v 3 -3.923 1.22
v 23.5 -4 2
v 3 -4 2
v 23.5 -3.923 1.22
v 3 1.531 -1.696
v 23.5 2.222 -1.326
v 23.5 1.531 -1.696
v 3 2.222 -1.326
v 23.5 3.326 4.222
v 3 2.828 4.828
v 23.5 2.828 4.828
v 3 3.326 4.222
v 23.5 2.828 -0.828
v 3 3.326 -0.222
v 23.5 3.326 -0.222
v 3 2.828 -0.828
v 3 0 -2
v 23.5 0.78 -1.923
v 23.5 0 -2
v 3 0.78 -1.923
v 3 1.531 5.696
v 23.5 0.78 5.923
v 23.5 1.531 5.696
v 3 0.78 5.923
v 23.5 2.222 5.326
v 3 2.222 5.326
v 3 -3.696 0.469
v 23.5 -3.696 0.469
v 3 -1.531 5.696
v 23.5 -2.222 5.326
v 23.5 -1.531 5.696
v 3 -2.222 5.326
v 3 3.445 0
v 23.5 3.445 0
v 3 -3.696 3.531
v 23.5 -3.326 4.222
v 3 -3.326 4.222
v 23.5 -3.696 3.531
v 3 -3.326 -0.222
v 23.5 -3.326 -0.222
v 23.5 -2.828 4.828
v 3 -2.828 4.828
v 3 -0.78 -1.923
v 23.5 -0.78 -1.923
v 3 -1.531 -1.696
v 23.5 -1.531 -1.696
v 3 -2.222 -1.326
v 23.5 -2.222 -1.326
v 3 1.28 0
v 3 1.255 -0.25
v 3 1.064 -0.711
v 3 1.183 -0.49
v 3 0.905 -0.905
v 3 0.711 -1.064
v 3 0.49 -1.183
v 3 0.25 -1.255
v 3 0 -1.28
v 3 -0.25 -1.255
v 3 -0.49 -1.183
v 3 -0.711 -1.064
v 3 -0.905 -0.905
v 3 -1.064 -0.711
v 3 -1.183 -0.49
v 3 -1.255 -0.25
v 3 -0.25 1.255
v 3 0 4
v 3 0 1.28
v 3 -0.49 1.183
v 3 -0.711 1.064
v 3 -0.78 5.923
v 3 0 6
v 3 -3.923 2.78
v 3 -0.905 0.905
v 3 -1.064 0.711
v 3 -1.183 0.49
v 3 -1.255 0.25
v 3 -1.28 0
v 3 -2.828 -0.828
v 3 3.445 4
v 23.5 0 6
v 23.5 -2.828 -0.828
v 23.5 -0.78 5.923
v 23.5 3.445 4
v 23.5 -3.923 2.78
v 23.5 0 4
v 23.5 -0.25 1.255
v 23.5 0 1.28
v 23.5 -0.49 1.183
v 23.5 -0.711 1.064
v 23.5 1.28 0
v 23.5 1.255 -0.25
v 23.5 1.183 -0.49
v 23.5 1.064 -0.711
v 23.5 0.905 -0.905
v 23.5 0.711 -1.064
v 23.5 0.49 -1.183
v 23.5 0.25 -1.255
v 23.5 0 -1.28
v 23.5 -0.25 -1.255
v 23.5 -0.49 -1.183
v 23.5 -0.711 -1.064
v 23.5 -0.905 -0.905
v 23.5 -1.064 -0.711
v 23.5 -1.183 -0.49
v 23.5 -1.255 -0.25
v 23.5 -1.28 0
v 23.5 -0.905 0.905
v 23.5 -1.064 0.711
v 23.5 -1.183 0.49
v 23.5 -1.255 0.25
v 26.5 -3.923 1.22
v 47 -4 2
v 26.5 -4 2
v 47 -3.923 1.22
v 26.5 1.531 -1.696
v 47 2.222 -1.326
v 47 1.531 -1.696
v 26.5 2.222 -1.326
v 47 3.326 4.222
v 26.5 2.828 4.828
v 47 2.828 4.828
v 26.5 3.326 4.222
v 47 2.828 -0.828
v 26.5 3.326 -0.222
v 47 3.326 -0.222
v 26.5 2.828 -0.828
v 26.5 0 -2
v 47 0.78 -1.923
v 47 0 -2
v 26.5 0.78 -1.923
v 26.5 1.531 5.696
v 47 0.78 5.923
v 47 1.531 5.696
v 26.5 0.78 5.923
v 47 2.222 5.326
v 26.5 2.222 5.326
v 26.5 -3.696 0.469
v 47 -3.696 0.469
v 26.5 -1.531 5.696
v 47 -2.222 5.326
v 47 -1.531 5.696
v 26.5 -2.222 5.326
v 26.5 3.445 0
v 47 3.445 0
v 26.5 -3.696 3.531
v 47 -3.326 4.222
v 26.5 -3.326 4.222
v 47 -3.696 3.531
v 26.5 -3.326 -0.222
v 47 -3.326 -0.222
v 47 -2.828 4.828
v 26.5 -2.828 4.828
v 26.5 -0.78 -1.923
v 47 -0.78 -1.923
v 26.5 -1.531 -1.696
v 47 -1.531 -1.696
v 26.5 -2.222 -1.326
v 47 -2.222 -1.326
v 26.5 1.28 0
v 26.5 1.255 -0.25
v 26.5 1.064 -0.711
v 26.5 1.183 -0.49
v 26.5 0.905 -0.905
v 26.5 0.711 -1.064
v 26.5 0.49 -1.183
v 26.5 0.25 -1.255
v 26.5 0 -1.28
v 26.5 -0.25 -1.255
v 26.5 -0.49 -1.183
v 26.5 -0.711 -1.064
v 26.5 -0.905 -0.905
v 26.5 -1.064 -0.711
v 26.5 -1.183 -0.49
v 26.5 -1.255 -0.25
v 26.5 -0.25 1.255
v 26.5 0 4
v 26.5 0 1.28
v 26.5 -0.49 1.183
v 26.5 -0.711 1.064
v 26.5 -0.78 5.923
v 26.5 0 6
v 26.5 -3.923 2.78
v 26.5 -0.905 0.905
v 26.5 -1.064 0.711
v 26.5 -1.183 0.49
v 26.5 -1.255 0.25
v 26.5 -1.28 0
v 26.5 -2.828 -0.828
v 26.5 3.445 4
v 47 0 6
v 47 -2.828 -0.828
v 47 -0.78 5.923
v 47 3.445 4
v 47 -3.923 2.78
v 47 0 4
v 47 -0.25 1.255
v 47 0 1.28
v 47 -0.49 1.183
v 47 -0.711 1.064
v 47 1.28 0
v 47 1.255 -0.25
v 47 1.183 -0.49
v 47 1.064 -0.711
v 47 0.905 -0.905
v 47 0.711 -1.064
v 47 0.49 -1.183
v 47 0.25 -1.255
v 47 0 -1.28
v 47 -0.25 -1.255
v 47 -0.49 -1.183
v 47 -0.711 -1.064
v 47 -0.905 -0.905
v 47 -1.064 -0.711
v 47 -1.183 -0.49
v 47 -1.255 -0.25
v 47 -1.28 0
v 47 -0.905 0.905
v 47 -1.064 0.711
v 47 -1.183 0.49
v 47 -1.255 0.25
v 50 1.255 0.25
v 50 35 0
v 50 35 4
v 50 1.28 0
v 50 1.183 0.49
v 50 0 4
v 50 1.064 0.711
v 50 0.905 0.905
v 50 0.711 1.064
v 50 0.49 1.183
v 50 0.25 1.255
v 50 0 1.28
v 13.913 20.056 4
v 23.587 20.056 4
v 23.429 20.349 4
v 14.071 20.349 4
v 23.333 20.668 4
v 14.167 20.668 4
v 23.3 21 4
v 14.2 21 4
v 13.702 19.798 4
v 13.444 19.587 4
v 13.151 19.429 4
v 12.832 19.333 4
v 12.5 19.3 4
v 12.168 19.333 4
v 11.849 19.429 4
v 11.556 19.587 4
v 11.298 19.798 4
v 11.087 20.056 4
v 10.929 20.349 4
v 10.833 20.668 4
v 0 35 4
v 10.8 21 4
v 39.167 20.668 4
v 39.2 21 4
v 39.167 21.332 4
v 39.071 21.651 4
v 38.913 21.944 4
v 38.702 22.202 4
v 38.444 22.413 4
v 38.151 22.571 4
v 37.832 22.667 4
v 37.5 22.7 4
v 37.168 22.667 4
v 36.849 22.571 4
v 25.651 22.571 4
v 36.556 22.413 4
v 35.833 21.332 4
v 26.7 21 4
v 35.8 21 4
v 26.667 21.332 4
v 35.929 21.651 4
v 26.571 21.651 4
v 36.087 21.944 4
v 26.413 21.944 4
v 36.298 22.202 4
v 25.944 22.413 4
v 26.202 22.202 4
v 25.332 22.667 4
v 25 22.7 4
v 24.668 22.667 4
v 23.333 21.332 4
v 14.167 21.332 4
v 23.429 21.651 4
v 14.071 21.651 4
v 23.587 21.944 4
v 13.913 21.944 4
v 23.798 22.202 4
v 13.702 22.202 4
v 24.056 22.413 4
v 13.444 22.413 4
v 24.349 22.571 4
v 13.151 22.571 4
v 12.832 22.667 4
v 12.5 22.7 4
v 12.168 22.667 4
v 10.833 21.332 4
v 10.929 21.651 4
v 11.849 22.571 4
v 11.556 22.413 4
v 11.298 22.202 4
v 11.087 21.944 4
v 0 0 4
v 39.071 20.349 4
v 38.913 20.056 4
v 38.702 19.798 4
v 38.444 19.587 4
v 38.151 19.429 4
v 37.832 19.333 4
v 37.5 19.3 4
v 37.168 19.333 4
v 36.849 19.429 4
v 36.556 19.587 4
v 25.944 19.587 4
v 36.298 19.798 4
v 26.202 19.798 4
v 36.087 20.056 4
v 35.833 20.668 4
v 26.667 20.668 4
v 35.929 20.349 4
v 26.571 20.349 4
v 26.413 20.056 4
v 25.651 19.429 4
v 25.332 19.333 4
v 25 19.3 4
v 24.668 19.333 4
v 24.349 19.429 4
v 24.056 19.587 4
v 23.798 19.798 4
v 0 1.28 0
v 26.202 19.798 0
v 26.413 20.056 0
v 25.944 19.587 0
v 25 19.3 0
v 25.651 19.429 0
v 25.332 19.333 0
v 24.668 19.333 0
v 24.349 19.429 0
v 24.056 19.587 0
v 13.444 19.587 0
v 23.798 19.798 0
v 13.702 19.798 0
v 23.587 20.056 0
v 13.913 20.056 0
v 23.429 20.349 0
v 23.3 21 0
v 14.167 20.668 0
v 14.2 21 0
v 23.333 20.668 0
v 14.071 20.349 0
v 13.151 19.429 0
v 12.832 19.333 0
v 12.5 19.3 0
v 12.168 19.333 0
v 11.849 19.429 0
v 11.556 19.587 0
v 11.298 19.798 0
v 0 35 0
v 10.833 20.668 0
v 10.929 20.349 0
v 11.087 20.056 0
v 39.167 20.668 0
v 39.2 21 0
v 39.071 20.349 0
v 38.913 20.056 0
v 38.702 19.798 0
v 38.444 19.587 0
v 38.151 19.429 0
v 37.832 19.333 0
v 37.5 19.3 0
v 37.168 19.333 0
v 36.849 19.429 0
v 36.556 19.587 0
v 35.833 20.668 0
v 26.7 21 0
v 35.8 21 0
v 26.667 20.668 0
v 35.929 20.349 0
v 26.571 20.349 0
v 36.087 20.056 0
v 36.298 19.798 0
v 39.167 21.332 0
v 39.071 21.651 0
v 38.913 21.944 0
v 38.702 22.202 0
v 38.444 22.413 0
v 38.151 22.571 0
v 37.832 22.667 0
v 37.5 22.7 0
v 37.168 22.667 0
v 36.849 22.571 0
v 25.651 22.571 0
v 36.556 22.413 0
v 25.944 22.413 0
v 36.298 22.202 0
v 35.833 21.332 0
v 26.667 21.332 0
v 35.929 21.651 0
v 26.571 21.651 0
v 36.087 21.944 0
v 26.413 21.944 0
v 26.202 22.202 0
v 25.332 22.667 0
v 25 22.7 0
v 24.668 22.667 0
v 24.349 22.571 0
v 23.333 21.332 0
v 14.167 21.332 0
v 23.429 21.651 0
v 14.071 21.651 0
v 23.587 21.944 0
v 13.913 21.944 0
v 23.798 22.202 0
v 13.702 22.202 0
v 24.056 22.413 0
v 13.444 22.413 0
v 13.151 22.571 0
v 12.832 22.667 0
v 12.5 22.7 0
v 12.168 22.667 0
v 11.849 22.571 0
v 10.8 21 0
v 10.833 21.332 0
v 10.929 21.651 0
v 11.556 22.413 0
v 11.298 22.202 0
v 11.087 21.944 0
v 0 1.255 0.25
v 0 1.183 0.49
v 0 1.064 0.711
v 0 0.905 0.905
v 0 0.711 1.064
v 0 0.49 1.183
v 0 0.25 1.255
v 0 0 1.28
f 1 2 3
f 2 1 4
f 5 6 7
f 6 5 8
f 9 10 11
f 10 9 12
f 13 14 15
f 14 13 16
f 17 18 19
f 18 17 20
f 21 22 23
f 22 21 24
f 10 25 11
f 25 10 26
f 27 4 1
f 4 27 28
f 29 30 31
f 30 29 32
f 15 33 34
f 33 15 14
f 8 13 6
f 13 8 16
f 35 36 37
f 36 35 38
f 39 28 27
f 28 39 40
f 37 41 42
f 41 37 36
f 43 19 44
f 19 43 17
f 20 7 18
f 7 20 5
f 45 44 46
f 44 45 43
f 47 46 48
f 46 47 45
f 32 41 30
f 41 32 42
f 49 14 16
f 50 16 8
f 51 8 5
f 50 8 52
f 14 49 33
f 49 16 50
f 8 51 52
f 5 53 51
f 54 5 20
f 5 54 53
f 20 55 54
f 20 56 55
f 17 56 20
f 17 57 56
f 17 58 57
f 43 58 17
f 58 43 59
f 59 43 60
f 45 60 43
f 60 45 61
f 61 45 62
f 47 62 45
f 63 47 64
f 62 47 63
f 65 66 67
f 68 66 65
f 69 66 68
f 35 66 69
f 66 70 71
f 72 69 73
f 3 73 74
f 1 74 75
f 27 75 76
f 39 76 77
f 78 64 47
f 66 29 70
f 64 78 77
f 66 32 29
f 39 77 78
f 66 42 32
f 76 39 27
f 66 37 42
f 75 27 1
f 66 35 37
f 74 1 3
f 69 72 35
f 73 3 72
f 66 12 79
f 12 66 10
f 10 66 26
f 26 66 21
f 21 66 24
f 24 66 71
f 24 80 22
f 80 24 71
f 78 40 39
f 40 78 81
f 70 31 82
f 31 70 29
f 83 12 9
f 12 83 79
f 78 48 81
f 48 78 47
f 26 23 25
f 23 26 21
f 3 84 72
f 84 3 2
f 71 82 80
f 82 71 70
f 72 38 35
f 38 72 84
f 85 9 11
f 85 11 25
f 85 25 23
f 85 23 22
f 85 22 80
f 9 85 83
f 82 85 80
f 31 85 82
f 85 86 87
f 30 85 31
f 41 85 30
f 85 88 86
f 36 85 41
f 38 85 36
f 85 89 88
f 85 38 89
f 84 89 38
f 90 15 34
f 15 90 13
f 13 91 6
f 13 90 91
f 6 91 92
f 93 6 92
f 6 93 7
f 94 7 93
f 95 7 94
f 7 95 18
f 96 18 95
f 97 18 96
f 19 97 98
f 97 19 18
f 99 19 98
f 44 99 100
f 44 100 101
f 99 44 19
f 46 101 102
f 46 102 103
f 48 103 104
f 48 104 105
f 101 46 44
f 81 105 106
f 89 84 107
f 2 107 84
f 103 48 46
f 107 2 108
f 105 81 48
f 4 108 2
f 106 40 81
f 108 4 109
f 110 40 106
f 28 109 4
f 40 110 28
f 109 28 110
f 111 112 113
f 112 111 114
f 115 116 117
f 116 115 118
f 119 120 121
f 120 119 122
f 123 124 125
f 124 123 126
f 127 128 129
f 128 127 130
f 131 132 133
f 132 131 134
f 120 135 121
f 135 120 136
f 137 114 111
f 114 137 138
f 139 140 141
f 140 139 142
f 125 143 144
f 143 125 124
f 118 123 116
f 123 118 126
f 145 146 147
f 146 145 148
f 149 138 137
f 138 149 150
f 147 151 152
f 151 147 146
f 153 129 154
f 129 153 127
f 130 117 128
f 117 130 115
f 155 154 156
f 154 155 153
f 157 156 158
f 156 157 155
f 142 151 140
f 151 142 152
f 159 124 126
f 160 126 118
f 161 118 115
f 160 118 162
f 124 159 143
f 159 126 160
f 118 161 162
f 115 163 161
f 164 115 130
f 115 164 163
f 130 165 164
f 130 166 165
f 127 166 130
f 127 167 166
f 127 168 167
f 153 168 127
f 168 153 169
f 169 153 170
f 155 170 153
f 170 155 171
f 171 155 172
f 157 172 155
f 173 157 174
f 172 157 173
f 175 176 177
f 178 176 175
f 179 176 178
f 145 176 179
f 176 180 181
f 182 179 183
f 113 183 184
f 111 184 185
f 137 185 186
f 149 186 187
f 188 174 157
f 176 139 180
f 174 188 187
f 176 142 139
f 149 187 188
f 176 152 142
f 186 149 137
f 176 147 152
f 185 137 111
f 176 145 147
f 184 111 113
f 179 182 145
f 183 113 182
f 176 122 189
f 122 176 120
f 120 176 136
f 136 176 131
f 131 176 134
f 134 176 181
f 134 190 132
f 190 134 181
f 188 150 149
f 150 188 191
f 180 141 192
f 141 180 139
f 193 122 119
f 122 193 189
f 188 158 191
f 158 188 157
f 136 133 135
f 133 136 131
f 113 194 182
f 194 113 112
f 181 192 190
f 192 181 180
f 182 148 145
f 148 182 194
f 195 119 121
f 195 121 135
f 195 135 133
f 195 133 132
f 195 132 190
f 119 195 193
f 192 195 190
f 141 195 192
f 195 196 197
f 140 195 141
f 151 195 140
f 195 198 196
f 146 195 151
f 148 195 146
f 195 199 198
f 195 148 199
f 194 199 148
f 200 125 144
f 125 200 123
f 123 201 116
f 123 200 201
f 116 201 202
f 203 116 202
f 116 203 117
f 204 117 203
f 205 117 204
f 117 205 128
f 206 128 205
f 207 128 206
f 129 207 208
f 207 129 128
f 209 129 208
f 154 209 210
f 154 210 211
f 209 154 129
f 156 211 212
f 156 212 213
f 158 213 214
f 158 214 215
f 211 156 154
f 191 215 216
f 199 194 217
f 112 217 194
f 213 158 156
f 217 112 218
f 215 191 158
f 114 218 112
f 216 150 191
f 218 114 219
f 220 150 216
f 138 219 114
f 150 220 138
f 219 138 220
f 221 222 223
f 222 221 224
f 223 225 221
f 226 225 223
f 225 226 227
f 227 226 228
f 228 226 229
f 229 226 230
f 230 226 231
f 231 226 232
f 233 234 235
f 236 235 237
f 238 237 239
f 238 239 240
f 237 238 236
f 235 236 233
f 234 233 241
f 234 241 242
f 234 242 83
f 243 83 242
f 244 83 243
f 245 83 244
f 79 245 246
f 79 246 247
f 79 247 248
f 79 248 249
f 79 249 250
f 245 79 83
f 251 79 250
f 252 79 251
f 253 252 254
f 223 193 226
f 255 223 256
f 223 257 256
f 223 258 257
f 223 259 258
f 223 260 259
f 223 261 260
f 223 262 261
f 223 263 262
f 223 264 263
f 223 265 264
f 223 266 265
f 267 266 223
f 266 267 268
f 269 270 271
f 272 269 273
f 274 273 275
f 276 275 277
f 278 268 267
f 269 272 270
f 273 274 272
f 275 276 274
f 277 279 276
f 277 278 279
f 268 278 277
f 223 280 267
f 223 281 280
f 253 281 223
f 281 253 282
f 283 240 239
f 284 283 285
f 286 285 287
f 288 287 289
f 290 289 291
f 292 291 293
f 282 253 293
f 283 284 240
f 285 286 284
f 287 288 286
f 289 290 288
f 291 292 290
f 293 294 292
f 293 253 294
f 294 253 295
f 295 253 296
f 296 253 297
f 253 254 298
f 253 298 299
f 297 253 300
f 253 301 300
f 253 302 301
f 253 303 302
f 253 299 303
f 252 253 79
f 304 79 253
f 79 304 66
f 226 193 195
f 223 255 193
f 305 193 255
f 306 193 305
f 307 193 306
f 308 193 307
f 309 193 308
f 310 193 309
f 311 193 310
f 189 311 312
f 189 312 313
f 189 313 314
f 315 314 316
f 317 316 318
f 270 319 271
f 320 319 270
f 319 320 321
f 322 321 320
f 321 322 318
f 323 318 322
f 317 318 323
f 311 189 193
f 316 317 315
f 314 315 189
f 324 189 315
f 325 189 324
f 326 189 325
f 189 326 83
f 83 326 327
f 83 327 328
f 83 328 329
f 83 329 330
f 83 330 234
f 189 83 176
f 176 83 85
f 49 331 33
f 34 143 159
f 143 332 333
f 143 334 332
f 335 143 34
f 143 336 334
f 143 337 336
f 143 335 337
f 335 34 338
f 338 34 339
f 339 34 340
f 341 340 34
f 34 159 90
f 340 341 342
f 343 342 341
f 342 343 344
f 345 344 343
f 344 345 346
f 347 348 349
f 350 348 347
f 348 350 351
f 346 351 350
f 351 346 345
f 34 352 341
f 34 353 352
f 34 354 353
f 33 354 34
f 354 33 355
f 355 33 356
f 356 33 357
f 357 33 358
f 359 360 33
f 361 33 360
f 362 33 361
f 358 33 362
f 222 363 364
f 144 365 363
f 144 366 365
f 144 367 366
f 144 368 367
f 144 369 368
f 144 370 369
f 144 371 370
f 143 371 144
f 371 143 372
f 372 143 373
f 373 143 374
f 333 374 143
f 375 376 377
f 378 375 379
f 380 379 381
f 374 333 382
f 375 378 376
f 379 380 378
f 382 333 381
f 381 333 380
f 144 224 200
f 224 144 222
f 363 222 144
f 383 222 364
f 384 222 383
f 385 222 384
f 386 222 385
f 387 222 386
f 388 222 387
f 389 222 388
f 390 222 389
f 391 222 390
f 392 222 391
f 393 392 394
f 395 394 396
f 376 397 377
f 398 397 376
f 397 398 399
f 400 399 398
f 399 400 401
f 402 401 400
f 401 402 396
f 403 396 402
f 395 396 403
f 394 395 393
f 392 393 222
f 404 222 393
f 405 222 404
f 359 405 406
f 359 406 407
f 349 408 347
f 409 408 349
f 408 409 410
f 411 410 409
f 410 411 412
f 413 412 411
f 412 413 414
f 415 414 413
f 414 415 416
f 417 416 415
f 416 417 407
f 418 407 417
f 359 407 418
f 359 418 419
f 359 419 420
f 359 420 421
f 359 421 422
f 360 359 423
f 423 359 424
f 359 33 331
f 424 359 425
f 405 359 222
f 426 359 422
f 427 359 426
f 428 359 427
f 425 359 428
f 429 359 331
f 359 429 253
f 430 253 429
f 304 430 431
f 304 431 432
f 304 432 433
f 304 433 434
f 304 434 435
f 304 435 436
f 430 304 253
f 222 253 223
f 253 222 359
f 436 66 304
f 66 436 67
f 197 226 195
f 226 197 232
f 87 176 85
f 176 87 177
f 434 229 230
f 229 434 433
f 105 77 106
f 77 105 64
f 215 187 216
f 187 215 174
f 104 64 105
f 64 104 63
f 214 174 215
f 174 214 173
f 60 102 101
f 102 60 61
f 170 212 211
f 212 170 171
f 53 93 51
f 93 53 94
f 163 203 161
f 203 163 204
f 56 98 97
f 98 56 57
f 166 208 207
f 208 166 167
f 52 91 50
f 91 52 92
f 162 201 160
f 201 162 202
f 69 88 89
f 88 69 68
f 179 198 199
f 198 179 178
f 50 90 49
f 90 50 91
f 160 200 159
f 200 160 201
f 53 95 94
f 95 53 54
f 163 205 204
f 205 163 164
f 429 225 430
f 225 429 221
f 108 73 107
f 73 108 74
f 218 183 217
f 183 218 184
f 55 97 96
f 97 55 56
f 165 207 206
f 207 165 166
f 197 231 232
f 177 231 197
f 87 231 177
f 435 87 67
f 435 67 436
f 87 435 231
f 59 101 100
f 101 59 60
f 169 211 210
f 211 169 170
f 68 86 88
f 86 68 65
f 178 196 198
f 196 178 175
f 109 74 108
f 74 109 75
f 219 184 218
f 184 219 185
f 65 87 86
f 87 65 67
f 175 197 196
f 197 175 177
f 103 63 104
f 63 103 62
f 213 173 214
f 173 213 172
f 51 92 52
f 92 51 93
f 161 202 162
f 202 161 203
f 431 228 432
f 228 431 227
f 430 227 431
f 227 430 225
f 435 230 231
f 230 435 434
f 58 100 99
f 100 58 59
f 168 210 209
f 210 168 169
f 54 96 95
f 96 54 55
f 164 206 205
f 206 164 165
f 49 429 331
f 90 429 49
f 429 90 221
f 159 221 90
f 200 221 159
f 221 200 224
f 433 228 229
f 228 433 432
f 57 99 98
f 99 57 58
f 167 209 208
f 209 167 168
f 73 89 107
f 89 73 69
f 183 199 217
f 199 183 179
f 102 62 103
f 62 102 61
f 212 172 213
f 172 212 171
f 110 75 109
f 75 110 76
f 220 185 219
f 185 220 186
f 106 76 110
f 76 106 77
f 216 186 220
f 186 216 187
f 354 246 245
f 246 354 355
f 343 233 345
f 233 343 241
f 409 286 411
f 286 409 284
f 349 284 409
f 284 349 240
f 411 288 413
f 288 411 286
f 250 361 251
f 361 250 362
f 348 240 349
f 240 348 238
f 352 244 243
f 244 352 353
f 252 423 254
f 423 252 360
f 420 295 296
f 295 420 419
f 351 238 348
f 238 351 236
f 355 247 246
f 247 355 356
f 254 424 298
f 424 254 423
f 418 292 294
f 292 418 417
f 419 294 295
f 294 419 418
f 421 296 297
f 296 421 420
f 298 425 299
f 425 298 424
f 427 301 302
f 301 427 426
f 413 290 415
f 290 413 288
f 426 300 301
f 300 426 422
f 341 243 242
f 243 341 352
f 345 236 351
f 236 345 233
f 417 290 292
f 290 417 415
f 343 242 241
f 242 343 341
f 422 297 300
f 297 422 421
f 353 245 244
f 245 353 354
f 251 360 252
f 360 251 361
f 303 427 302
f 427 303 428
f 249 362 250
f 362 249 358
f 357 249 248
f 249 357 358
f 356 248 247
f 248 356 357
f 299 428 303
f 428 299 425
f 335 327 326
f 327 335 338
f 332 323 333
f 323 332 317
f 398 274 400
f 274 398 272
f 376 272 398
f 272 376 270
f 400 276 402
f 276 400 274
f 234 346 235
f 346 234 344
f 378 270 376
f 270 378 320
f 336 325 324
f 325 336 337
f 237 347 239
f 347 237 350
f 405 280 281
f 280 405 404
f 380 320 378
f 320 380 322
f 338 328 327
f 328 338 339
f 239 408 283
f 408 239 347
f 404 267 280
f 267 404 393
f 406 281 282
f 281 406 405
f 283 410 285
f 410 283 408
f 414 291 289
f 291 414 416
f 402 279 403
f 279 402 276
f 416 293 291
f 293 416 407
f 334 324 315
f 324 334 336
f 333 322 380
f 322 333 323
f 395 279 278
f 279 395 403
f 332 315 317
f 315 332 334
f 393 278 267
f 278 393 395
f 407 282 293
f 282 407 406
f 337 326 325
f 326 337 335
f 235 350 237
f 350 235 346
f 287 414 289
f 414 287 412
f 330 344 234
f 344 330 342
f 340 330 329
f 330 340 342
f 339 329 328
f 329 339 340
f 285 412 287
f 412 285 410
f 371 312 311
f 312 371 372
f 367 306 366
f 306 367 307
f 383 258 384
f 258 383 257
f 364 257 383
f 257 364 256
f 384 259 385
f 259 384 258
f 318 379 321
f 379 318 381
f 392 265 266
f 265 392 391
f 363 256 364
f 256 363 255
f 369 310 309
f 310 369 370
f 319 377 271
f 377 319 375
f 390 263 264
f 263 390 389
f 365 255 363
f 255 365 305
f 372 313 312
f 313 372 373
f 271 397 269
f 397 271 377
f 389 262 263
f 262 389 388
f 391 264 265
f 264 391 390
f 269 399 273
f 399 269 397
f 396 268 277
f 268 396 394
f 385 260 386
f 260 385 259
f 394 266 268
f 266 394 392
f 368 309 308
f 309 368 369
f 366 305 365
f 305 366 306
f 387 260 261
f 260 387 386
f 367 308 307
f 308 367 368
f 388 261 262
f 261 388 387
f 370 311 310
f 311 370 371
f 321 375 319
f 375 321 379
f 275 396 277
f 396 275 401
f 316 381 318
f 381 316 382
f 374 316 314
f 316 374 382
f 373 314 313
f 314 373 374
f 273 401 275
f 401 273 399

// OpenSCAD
$fn = 32;

// ----------------------------------------------------------------------
// Hinge leaf: 50 x 39 x 8 mm
// ----------------------------------------------------------------------

// --- parameters (mm) ---
plate_len = 50;           // leaf length, X
plate_w = 35;             // leaf width, Y
plate_t = 4;              // leaf thickness
barrel_d = 8;             // knuckle diameter
barrel_w = 20.5;          // knuckle width
knuckle_n = 2;            // number of knuckles
pin_d = 2.56;             // pin bore
gap = 3;                  // gap between the knuckles
screw_d = 3.4;            // screw clearance

module leaf() {
  cube([plate_len, plate_w, plate_t]);
}

module knuckles() {
  /* barrels sit on the leaf edge, the pin axis at half the leaf thickness */
  for (i = [0 : knuckle_n - 1])
    translate([gap + i * (barrel_w + gap), 0, plate_t * 0.5])
      rotate([0, 90, 0]) cylinder(h = barrel_w, d = barrel_d);
}

difference() {
  union() {
    leaf();
    knuckles();
  }
  rotate([0, 90, 0]) translate([0, 0, -1])
    cylinder(h = plate_len + 2, d = pin_d);
  translate([12.5, plate_w * 0.6, -1]) cylinder(h = plate_t + 2, d = screw_d);
  translate([25, plate_w * 0.6, -1]) cylinder(h = plate_t + 2, d = screw_d);
  translate([37.5, plate_w * 0.6, -1]) cylinder(h = plate_t + 2, d = screw_d);
}
